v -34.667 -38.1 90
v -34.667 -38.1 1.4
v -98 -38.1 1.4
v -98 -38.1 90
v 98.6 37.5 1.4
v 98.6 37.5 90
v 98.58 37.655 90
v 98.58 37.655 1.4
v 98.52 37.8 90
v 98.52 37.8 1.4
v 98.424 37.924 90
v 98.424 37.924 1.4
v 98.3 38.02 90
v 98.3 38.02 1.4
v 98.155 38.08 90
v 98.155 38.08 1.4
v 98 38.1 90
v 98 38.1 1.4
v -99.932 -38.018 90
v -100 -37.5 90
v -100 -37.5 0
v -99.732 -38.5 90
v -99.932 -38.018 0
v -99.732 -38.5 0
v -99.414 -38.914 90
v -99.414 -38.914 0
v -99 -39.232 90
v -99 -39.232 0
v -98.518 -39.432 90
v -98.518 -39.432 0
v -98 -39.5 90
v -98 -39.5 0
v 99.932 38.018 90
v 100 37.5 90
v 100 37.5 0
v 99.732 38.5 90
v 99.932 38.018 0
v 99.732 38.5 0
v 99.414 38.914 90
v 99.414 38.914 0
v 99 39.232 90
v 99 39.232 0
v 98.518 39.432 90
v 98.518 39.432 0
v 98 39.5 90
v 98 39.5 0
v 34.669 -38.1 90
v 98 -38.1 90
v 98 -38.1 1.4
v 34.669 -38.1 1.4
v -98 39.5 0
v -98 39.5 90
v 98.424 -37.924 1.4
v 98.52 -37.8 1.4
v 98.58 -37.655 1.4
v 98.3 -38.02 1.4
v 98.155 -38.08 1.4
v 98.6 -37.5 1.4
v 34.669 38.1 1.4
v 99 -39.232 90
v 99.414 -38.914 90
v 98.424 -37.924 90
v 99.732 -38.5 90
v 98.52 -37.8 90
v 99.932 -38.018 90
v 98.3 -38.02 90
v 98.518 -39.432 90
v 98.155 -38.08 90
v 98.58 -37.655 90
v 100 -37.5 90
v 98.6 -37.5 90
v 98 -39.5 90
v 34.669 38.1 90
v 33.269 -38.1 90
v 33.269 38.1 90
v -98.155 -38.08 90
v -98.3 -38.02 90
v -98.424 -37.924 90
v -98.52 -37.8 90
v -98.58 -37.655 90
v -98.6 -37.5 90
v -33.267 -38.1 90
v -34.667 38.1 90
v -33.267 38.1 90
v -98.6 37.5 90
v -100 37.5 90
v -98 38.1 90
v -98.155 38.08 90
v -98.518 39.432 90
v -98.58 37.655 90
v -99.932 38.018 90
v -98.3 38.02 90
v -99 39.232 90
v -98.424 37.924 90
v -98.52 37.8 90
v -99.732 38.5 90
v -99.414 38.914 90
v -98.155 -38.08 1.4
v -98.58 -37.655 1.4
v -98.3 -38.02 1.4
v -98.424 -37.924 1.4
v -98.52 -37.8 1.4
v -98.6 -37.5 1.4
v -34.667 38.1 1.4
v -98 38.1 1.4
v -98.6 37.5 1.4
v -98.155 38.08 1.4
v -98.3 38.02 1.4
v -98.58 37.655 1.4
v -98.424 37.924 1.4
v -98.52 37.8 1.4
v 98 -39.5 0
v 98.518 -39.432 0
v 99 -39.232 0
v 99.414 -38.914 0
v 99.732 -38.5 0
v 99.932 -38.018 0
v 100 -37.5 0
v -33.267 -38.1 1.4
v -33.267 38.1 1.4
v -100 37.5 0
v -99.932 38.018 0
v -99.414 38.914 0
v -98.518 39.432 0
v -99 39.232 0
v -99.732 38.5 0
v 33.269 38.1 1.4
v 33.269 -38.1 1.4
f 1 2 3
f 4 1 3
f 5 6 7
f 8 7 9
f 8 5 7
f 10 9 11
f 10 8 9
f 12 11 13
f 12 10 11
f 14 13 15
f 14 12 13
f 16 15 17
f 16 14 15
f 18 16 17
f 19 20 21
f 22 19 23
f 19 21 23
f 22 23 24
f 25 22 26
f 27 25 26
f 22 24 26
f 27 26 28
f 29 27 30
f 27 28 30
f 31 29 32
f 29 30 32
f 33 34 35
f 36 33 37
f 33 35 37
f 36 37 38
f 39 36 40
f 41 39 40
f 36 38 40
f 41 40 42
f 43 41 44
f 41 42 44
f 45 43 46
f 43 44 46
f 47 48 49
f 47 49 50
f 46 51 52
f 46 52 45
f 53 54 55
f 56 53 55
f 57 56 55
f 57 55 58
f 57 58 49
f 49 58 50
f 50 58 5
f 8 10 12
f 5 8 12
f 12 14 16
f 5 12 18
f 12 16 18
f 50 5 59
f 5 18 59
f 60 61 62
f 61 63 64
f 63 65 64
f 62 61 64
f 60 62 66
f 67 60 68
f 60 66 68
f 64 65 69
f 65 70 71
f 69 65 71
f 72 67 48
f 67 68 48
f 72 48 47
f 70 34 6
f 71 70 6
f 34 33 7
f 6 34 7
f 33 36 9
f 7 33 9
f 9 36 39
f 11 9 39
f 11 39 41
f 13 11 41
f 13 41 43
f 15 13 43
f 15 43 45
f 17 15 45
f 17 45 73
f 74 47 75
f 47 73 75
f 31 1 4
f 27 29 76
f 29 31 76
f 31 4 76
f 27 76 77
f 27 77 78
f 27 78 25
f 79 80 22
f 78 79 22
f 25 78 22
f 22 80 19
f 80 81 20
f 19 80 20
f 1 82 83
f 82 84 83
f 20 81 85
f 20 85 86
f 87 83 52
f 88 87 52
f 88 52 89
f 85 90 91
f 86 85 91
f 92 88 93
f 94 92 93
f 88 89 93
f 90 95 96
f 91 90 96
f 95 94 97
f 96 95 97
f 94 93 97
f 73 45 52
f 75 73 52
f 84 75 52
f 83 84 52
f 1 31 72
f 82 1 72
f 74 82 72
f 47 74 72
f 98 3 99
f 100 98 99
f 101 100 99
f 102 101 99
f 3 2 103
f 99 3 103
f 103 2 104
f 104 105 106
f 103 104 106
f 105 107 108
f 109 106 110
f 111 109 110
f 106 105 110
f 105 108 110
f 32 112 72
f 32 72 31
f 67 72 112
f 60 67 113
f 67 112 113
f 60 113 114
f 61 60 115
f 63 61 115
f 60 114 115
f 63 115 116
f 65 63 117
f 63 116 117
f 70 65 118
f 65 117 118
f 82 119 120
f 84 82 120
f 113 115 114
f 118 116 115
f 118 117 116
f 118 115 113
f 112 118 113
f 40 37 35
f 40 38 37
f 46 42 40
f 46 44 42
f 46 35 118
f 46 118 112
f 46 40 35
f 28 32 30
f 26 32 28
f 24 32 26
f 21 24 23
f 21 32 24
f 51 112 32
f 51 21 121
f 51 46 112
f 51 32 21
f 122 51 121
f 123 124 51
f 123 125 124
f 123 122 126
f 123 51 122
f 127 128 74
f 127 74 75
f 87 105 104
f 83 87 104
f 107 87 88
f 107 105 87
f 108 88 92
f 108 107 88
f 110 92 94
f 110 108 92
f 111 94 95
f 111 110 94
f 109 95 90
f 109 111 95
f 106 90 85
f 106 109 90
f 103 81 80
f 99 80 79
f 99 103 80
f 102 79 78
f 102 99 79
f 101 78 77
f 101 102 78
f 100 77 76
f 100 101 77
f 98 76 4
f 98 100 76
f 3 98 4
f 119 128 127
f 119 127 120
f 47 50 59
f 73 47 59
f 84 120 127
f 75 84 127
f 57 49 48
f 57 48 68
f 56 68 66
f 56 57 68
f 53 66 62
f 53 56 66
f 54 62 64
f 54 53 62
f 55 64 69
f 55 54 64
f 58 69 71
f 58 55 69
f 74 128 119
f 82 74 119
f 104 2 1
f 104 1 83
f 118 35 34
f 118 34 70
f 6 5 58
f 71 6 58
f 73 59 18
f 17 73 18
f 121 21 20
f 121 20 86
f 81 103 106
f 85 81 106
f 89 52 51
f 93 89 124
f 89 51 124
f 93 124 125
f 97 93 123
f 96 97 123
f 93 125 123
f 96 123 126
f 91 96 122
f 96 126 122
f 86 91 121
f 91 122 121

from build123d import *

# Parameters (mm, degrees)
PAD_DEPTH    = 90
THICKNESS_T  = -1.4
SKETCH001_W  = 1.4
SKETCH001_H  = 76.2
PAD001_DEPTH = 88.6


with BuildPart() as part:
    # Sketch → Pad (new body)
    with BuildSketch(Plane.XY):
        with BuildLine():
            Line((-98, 39.5), (98, 39.5))
            ThreePointArc((100, 37.5), (99.414214, 38.914214), (98, 39.5))
            Line((100, 37.5), (100, -37.5))
            ThreePointArc((98, -39.5), (99.414214, -38.914214), (100, -37.5))
            Line((98, -39.5), (-98, -39.5))
            ThreePointArc((-100, -37.5), (-99.414214, -38.914214), (-98, -39.5))
            Line((-100, -37.5), (-100, 37.5))
            ThreePointArc((-98, 39.5), (-99.414214, 38.914214), (-100, 37.5))
        make_face()
    extrude(amount=PAD_DEPTH)

    # Thickness
    thickness_openings = [part.faces().sort_by_distance(p)[0] for p in [
        (0, 0, 90),
    ]]
    offset(amount=THICKNESS_T, openings=thickness_openings)

    # Sketch001 (on Face19 of Thickness) → Pad001 (join)
    with BuildSketch(Plane.XY.offset(1.4)):
        with Locations((-33.966667, 0)):
            Rectangle(SKETCH001_W, SKETCH001_H)
        with Locations((33.969422, 0)):
            Rectangle(SKETCH001_W, SKETCH001_H)
    extrude(amount=PAD001_DEPTH)


solid = part.part
